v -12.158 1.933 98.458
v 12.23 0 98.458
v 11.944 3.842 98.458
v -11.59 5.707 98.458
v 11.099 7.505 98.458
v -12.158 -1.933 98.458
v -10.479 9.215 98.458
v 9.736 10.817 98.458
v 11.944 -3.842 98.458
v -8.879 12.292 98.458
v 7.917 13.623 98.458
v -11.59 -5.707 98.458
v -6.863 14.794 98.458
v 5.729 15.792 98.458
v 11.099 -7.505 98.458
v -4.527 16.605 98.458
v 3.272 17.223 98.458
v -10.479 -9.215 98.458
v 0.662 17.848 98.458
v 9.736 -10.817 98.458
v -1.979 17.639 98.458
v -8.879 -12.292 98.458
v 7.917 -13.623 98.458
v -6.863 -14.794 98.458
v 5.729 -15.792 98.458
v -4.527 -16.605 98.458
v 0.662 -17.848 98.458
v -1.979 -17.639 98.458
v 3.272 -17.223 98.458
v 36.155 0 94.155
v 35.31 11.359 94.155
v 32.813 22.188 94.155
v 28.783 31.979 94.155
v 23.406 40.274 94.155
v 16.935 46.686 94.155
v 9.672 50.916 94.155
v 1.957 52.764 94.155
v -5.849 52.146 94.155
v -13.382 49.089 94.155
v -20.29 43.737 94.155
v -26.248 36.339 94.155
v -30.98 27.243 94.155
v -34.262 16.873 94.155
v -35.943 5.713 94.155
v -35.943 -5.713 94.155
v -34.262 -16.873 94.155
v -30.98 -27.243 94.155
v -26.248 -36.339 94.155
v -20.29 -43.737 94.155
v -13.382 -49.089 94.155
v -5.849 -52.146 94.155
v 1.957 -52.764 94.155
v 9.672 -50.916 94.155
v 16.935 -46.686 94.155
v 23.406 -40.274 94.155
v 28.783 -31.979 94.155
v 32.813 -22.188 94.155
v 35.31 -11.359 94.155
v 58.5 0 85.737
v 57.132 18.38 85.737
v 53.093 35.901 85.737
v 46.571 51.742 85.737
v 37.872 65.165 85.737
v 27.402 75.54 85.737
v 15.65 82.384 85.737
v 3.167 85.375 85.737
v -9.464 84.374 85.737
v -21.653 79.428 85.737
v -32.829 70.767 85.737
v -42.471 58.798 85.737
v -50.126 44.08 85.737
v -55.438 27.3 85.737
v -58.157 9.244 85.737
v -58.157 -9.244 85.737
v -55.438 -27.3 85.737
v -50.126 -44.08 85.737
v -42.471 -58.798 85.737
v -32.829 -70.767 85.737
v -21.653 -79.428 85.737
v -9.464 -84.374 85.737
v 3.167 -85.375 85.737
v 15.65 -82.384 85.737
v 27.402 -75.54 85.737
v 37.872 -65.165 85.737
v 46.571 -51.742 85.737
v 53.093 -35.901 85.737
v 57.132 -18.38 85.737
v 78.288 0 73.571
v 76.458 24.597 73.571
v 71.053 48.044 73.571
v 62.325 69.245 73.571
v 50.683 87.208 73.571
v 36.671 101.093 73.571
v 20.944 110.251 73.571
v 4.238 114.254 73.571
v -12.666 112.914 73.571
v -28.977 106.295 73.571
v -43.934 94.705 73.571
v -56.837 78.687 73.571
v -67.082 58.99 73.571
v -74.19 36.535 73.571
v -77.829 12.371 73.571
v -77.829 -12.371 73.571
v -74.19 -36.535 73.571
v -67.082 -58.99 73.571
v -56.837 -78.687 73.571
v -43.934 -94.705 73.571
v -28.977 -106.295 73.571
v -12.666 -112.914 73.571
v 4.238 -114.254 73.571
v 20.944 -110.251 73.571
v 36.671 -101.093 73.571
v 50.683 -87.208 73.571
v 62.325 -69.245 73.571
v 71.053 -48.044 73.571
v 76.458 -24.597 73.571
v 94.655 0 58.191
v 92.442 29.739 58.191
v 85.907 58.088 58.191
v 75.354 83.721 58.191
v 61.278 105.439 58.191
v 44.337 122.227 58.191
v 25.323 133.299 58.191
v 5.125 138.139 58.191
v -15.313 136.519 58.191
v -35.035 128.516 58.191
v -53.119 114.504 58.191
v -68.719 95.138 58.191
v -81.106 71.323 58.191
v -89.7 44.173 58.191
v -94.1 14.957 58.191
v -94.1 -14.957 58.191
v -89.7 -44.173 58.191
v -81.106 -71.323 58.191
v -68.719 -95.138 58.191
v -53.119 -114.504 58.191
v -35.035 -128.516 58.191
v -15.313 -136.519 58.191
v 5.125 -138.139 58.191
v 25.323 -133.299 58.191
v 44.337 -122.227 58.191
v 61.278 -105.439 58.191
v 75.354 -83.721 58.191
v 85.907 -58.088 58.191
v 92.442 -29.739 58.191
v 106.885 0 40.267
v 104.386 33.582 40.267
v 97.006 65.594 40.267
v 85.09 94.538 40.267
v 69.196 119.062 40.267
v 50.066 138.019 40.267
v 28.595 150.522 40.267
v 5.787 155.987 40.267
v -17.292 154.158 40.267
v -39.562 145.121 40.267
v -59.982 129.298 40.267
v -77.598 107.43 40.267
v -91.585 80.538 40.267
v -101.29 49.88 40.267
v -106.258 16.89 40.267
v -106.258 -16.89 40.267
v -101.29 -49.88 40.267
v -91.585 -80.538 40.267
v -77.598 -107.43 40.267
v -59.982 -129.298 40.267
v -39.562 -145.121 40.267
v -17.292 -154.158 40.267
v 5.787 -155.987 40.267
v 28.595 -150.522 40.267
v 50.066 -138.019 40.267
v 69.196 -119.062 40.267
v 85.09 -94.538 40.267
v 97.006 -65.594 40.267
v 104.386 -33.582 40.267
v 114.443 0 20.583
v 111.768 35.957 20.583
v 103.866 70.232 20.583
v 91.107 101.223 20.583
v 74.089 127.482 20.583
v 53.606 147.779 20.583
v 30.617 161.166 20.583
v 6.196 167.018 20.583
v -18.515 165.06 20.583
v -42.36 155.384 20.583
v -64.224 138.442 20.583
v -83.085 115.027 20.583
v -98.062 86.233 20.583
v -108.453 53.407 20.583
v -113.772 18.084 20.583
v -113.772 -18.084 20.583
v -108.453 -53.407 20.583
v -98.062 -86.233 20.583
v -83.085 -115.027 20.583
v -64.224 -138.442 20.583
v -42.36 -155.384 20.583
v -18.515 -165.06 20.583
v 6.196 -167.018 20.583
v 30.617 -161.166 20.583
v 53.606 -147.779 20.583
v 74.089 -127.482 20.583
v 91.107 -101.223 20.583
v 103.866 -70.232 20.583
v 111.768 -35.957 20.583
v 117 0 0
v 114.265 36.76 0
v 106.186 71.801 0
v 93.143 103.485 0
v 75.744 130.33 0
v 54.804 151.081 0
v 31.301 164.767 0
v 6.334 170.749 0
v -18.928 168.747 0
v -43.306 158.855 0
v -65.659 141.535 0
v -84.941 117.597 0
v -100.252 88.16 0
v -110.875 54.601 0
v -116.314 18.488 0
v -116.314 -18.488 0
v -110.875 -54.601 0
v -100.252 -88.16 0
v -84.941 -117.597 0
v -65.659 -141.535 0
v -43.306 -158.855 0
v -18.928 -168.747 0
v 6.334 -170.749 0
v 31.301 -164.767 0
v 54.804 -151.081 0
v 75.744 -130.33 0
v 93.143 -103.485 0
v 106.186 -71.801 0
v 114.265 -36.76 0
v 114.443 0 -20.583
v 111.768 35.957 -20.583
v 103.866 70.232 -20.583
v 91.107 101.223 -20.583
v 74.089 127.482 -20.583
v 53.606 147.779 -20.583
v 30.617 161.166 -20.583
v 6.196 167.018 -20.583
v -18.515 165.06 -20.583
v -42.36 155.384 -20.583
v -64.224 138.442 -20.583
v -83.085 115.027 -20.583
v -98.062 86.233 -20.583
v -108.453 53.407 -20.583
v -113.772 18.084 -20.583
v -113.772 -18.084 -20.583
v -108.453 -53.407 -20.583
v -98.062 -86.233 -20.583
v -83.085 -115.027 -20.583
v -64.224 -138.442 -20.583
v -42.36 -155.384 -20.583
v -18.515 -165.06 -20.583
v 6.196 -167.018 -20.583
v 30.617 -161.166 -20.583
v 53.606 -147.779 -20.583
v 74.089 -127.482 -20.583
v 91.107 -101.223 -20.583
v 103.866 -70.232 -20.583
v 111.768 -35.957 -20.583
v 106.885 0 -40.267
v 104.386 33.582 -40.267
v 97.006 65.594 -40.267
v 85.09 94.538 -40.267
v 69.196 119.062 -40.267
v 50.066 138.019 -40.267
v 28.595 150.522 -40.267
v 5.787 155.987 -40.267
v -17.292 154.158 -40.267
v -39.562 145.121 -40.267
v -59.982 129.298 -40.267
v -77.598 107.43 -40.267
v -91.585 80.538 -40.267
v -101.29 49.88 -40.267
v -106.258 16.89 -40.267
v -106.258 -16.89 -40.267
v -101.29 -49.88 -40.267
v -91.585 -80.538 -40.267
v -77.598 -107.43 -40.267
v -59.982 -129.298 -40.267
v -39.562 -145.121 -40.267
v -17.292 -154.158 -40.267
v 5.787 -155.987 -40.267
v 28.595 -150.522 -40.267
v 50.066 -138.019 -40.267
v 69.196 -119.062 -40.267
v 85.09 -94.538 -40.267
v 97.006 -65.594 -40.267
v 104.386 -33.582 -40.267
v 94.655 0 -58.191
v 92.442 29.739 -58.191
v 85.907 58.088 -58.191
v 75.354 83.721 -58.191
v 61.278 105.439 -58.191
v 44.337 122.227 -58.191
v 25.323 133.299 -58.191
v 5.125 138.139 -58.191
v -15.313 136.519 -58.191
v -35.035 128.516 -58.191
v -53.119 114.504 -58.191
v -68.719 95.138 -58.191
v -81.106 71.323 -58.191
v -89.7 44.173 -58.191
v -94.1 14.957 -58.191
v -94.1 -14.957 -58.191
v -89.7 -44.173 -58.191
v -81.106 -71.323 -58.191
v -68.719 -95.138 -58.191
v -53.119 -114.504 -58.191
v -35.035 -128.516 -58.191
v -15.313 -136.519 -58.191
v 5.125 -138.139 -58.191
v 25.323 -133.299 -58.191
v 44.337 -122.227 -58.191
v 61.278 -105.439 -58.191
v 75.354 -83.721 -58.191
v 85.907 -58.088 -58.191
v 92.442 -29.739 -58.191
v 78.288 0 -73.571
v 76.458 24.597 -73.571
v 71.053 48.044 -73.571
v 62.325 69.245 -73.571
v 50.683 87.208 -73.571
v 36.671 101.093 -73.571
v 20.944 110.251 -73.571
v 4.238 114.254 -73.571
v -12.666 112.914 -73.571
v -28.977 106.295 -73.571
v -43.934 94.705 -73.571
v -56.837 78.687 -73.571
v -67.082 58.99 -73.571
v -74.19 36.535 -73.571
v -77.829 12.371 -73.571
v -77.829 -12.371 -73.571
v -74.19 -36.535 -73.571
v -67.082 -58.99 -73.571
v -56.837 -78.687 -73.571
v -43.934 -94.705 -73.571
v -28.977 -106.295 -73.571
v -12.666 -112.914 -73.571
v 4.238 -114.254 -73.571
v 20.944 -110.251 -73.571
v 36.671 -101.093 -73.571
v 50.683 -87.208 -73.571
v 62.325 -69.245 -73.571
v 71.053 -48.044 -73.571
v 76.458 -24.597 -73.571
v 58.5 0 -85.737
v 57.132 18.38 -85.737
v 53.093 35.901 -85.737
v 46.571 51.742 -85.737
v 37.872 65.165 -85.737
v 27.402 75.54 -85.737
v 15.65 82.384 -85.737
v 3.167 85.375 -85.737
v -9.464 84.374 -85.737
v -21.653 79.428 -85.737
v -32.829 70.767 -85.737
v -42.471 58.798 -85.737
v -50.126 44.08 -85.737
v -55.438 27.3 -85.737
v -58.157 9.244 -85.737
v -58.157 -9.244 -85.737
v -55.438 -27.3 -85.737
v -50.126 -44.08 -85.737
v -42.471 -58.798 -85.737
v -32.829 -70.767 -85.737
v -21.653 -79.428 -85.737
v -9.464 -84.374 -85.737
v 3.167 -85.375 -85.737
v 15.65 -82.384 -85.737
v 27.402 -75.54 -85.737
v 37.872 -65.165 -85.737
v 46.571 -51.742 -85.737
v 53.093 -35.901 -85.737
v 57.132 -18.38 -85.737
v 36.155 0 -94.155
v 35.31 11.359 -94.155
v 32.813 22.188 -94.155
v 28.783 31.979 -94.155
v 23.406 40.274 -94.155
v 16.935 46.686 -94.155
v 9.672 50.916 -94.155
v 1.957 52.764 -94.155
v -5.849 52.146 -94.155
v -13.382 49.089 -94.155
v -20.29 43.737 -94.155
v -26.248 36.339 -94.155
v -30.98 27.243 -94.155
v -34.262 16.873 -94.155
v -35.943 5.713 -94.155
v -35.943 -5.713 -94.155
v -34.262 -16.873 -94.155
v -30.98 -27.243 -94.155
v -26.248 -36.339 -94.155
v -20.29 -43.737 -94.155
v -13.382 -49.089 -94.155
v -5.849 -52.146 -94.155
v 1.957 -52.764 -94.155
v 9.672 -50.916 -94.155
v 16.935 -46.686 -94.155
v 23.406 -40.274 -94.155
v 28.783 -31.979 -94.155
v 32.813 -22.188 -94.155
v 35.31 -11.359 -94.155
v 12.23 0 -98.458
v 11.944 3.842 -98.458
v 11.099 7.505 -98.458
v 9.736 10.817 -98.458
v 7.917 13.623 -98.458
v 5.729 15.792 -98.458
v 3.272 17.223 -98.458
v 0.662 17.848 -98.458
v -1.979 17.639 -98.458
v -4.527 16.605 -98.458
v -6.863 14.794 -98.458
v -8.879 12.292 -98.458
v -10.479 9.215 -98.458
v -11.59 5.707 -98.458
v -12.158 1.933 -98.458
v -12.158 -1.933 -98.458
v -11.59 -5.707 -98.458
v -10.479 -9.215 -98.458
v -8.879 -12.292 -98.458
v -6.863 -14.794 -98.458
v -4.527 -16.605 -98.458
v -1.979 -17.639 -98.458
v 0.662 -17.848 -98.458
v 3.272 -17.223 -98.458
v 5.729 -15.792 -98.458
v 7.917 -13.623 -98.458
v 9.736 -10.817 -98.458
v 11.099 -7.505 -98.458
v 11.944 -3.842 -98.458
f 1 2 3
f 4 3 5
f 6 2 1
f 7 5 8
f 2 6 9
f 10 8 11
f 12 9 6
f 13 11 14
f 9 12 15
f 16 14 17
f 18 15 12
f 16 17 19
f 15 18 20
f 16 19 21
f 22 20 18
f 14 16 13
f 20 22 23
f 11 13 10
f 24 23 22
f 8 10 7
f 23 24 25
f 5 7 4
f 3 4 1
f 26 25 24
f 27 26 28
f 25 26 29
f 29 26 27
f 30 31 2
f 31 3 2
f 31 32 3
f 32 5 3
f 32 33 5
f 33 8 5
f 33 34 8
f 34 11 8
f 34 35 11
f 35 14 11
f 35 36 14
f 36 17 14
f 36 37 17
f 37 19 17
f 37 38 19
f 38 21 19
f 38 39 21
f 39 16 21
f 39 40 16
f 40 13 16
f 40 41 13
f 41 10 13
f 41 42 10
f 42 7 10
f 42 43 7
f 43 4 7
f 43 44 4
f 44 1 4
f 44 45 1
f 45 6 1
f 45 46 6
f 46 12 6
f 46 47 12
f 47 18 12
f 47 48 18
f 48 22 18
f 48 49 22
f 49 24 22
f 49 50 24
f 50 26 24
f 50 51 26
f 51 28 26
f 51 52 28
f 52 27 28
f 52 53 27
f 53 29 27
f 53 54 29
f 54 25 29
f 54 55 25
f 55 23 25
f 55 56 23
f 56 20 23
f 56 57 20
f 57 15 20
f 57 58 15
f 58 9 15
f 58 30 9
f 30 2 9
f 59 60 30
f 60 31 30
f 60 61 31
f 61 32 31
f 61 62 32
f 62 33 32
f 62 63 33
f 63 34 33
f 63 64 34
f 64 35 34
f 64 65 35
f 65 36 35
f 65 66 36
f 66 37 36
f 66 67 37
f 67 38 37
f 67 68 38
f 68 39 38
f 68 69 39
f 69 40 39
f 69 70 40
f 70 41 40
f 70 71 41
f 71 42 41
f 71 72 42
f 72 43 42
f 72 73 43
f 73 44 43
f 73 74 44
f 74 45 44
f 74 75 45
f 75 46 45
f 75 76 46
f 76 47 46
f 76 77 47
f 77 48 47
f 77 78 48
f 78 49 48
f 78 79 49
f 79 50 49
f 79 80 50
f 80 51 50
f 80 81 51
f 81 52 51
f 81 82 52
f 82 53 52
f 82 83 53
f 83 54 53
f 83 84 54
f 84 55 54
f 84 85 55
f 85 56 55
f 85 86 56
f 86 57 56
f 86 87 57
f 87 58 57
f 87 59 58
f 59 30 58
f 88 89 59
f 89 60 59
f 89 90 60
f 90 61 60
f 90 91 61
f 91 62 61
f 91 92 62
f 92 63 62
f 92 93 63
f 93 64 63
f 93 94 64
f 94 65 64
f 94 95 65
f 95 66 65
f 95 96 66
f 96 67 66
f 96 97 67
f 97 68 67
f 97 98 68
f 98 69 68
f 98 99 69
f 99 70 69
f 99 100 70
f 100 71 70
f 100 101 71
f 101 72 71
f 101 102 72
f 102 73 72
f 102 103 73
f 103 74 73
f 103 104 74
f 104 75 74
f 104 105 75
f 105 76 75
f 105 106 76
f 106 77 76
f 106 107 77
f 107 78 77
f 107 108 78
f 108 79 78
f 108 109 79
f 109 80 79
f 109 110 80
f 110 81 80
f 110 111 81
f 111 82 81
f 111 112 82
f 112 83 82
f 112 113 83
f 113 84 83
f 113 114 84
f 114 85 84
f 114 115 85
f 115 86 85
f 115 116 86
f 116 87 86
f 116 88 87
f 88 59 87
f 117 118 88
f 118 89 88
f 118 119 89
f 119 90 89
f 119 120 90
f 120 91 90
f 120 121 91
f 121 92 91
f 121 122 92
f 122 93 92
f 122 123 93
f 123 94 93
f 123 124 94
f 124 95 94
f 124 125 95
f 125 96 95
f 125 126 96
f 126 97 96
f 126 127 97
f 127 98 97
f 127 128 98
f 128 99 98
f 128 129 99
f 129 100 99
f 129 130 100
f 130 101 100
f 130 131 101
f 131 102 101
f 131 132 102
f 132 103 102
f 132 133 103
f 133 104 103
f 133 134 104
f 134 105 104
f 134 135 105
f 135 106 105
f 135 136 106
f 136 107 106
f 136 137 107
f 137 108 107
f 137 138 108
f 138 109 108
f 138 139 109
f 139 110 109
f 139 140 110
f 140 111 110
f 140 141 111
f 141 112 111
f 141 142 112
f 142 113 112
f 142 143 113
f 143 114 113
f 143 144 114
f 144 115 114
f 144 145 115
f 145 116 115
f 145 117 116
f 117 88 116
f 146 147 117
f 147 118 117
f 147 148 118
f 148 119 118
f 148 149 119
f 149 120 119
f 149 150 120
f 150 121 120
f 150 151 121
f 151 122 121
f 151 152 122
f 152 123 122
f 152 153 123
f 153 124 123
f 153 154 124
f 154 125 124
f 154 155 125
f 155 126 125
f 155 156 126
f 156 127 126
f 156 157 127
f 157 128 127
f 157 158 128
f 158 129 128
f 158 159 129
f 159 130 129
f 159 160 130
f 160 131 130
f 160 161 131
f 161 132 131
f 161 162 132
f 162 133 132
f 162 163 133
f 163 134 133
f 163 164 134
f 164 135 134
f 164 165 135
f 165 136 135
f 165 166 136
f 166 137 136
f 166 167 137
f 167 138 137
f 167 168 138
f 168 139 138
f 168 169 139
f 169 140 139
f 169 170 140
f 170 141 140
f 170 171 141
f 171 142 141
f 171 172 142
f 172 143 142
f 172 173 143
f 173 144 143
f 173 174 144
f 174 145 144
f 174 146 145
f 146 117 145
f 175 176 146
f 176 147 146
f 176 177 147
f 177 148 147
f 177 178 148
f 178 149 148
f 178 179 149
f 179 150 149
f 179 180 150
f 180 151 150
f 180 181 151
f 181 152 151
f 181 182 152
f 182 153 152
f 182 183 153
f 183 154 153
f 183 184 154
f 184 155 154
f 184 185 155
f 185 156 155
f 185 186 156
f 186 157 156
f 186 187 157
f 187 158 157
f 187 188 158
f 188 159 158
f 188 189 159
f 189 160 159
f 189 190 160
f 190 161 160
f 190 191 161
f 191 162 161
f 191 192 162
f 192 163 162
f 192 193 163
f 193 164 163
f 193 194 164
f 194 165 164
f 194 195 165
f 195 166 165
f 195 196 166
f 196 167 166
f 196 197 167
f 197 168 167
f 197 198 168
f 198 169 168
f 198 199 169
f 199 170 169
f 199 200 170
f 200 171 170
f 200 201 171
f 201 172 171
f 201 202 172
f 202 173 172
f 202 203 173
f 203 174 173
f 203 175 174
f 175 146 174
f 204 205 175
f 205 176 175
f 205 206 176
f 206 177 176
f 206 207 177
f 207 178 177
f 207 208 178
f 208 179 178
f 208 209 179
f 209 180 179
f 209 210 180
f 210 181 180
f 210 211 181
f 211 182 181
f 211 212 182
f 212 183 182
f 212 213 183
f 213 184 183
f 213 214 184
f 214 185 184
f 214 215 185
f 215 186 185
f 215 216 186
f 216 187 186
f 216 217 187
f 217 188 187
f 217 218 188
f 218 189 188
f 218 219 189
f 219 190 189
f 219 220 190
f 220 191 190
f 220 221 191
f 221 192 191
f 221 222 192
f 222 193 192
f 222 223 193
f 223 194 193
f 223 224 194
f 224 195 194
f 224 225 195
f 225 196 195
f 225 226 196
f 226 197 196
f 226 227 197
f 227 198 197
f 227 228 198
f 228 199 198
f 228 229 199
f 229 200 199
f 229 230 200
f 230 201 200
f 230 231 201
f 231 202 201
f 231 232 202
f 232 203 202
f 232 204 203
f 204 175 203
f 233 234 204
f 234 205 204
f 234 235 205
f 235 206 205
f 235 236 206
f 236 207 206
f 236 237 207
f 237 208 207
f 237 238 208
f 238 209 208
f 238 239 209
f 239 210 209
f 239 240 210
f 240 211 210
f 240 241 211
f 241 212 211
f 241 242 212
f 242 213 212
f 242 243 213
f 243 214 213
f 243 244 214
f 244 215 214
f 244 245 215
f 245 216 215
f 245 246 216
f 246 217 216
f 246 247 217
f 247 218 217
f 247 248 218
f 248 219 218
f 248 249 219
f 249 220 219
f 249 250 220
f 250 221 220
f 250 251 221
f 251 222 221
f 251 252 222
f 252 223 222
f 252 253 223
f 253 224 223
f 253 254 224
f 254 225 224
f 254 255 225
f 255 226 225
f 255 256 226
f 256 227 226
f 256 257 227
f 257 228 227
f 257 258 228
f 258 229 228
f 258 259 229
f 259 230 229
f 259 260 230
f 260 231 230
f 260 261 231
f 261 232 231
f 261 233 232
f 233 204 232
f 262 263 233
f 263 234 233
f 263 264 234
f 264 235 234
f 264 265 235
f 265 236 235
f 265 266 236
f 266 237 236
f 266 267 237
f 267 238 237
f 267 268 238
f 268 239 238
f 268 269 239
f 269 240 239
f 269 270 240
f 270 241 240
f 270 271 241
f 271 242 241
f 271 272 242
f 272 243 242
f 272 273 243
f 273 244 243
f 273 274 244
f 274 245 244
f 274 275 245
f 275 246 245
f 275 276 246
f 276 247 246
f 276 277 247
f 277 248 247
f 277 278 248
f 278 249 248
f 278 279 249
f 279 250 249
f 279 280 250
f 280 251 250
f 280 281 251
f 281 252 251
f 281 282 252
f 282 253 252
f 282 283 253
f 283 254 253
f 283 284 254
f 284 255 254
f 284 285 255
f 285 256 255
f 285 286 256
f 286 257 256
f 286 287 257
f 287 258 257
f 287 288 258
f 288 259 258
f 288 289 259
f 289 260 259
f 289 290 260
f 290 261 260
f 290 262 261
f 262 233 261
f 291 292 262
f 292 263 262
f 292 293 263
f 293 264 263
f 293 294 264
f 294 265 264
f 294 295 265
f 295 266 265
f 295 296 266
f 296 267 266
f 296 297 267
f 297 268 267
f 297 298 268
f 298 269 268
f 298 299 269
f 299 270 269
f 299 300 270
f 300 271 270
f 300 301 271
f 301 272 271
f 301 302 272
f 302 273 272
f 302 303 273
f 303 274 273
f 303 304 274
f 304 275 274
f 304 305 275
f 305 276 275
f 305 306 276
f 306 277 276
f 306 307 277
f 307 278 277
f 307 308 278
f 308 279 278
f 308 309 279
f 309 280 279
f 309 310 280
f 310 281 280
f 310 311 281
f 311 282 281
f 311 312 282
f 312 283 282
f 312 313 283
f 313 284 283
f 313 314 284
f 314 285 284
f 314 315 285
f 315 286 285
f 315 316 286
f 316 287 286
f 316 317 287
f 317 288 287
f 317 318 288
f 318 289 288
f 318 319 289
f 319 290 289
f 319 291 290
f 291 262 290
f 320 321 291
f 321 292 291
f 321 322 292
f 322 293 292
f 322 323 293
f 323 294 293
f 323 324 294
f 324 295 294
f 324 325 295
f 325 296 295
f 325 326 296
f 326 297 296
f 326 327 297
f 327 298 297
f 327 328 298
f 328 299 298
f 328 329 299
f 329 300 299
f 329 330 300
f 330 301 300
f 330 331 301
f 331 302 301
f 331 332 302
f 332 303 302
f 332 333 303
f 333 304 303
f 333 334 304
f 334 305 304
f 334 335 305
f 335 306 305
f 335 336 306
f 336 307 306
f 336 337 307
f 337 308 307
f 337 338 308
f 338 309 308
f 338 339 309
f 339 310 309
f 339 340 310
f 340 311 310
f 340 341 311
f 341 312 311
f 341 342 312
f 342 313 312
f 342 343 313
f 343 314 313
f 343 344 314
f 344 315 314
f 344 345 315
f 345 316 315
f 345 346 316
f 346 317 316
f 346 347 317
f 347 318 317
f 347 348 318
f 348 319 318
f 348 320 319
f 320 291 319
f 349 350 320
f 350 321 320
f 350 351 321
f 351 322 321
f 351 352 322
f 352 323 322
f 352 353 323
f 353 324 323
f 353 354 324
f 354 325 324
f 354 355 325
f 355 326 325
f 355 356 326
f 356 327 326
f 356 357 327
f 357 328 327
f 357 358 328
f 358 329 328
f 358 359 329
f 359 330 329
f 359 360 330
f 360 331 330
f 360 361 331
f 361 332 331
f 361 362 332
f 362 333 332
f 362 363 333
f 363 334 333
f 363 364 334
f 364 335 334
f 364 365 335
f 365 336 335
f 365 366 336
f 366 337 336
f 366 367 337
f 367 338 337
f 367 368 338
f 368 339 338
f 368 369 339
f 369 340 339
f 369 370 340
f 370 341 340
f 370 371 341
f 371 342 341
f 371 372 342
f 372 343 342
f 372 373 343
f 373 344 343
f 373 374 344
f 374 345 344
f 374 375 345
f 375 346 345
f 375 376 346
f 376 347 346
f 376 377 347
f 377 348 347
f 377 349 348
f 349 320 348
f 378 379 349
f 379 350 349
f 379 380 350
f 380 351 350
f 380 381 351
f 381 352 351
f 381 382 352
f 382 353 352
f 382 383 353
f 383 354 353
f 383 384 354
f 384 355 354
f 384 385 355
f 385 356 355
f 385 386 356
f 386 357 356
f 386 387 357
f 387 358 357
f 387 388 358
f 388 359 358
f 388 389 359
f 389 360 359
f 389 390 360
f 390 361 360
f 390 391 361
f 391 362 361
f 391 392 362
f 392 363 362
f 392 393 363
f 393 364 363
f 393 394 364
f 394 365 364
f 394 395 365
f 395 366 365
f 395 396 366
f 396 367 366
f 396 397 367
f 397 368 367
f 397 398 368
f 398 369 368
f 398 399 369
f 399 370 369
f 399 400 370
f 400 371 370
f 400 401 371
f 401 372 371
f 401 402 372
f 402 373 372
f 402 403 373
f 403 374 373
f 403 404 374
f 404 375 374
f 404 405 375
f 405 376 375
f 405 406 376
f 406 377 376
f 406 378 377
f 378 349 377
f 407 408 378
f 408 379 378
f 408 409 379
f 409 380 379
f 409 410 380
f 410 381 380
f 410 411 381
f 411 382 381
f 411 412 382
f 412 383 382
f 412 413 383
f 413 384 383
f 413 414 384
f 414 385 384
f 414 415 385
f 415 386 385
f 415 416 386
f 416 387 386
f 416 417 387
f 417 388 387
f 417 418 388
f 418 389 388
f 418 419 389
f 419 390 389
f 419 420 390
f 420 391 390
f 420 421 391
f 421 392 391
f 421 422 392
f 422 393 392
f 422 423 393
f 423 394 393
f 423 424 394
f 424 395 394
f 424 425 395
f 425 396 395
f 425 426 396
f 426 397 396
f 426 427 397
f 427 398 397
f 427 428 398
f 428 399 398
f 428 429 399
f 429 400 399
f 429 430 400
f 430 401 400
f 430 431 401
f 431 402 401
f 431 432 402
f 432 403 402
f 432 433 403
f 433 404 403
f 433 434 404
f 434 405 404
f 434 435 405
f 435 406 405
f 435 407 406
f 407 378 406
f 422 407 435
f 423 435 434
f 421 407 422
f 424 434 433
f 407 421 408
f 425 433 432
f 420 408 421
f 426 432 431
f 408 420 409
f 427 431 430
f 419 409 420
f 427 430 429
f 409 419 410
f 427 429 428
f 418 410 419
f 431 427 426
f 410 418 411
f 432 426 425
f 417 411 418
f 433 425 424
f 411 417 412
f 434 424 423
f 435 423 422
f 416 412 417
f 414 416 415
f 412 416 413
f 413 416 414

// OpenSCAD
// Generated by SolidPython 1.0.1 on 2020-07-29 00:46:51


scale(v = [13, 19, 11]) {
	sphere(r = 9);
}
/***********************************************
*********      SolidPython code:      **********
************************************************
 
# import packages: SolidPython
from solid import *
from solid.utils import *
from itertools import chain, combinations, permutations


class Resize:

    def __init__(self, scad_file):
        self.scad_file = scad_file
        #self.scad_file = import_scad(scad_file)
        # cone/cylinder param:
        self.r1 = 0
        self.r2 = 0
        self.h = 0
        # rectangular prism param:
        self.w = 0
        self.l = 0
        # ellipse param:
        self.r = 0

    # import OpenScad code (file name corresponds to shape)


    # classify shape + parameters
    def assign(self, param1, param2, param3):
        if self.scad_file == 'cone.scad':
            self.r1 = param1
            self.r2 = param2
            self.h = param3
        elif self.scad_file == 'cylinder.scad':
            self.r1 = param1
            self.r2 = param2
            self.h = param3
        elif self.scad_file == 'rectangularPrism.scad':
            self.h = param1
            self.l = param2
            self.w = param3
        else:
            self.r = param1
            self.h = param2

    # resize parameters
    def iterate(self):
        x = range(3, 20, 2)
        i = 1
        if self.scad_file == 'cone.scad':
            tempList = list(permutations(x, 2))
            for temp in tempList:
                param1 = temp[0]
                param2 = temp[1]
                filepath = 'produced_scad_files/' + 'cone' + str(param1) + '_' + str(param2) + '_' + '.scad'
                scad_render_to_file(cylinder(h=param1, r1=param2, r2=0), filepath)

        elif self.scad_file == 'cylinder.scad':
            tempList = list(permutations(x, 3))
            for temp in tempList:
                param1 = temp[0]
                param2 = temp[1]
                filepath = 'produced_scad_files/' + 'cylinder' + str(param1) + '_' + str(param2) + '_' + '.scad'
                scad_render_to_file(cylinder(h=param1, r1=param2, r2=param2), filepath)

        elif self.scad_file == 'rectangularPrism.scad':
            tempList = list(permutations(x, 3))
            for temp in tempList:
                param1 = temp[0]
                param2 = temp[1]
                param3 = temp[2]
                filepath = 'produced_scad_files/' + 'rectangularPrism' + str(param1) + '_' + str(param2) + '_' + str(
                    param3) + '.scad'
                scad_render_to_file(cube(size=(param1, param2, param3)), filepath)

        elif self.scad_file == 'ellipse.scad':
            tempList = list(permutations(x, 4))
            for temp in tempList:
                param1 = temp[0]
                param2 = temp[1]
                param3 = temp[2]
                param4 = temp[3]
                filepath = 'produced_scad_files/' + 'ellipse' + str(param1) + '_' + str(param2) + '_' + str(param3) + '_' + str(param4) + '.scad'
                scad_render_to_file(scale([param1, param2, param3])(sphere(r=param4)), filepath)

    def render_to_scadfile(self):
        scad_render_to_file(scad, 'example.scad') 
 
************************************************/
